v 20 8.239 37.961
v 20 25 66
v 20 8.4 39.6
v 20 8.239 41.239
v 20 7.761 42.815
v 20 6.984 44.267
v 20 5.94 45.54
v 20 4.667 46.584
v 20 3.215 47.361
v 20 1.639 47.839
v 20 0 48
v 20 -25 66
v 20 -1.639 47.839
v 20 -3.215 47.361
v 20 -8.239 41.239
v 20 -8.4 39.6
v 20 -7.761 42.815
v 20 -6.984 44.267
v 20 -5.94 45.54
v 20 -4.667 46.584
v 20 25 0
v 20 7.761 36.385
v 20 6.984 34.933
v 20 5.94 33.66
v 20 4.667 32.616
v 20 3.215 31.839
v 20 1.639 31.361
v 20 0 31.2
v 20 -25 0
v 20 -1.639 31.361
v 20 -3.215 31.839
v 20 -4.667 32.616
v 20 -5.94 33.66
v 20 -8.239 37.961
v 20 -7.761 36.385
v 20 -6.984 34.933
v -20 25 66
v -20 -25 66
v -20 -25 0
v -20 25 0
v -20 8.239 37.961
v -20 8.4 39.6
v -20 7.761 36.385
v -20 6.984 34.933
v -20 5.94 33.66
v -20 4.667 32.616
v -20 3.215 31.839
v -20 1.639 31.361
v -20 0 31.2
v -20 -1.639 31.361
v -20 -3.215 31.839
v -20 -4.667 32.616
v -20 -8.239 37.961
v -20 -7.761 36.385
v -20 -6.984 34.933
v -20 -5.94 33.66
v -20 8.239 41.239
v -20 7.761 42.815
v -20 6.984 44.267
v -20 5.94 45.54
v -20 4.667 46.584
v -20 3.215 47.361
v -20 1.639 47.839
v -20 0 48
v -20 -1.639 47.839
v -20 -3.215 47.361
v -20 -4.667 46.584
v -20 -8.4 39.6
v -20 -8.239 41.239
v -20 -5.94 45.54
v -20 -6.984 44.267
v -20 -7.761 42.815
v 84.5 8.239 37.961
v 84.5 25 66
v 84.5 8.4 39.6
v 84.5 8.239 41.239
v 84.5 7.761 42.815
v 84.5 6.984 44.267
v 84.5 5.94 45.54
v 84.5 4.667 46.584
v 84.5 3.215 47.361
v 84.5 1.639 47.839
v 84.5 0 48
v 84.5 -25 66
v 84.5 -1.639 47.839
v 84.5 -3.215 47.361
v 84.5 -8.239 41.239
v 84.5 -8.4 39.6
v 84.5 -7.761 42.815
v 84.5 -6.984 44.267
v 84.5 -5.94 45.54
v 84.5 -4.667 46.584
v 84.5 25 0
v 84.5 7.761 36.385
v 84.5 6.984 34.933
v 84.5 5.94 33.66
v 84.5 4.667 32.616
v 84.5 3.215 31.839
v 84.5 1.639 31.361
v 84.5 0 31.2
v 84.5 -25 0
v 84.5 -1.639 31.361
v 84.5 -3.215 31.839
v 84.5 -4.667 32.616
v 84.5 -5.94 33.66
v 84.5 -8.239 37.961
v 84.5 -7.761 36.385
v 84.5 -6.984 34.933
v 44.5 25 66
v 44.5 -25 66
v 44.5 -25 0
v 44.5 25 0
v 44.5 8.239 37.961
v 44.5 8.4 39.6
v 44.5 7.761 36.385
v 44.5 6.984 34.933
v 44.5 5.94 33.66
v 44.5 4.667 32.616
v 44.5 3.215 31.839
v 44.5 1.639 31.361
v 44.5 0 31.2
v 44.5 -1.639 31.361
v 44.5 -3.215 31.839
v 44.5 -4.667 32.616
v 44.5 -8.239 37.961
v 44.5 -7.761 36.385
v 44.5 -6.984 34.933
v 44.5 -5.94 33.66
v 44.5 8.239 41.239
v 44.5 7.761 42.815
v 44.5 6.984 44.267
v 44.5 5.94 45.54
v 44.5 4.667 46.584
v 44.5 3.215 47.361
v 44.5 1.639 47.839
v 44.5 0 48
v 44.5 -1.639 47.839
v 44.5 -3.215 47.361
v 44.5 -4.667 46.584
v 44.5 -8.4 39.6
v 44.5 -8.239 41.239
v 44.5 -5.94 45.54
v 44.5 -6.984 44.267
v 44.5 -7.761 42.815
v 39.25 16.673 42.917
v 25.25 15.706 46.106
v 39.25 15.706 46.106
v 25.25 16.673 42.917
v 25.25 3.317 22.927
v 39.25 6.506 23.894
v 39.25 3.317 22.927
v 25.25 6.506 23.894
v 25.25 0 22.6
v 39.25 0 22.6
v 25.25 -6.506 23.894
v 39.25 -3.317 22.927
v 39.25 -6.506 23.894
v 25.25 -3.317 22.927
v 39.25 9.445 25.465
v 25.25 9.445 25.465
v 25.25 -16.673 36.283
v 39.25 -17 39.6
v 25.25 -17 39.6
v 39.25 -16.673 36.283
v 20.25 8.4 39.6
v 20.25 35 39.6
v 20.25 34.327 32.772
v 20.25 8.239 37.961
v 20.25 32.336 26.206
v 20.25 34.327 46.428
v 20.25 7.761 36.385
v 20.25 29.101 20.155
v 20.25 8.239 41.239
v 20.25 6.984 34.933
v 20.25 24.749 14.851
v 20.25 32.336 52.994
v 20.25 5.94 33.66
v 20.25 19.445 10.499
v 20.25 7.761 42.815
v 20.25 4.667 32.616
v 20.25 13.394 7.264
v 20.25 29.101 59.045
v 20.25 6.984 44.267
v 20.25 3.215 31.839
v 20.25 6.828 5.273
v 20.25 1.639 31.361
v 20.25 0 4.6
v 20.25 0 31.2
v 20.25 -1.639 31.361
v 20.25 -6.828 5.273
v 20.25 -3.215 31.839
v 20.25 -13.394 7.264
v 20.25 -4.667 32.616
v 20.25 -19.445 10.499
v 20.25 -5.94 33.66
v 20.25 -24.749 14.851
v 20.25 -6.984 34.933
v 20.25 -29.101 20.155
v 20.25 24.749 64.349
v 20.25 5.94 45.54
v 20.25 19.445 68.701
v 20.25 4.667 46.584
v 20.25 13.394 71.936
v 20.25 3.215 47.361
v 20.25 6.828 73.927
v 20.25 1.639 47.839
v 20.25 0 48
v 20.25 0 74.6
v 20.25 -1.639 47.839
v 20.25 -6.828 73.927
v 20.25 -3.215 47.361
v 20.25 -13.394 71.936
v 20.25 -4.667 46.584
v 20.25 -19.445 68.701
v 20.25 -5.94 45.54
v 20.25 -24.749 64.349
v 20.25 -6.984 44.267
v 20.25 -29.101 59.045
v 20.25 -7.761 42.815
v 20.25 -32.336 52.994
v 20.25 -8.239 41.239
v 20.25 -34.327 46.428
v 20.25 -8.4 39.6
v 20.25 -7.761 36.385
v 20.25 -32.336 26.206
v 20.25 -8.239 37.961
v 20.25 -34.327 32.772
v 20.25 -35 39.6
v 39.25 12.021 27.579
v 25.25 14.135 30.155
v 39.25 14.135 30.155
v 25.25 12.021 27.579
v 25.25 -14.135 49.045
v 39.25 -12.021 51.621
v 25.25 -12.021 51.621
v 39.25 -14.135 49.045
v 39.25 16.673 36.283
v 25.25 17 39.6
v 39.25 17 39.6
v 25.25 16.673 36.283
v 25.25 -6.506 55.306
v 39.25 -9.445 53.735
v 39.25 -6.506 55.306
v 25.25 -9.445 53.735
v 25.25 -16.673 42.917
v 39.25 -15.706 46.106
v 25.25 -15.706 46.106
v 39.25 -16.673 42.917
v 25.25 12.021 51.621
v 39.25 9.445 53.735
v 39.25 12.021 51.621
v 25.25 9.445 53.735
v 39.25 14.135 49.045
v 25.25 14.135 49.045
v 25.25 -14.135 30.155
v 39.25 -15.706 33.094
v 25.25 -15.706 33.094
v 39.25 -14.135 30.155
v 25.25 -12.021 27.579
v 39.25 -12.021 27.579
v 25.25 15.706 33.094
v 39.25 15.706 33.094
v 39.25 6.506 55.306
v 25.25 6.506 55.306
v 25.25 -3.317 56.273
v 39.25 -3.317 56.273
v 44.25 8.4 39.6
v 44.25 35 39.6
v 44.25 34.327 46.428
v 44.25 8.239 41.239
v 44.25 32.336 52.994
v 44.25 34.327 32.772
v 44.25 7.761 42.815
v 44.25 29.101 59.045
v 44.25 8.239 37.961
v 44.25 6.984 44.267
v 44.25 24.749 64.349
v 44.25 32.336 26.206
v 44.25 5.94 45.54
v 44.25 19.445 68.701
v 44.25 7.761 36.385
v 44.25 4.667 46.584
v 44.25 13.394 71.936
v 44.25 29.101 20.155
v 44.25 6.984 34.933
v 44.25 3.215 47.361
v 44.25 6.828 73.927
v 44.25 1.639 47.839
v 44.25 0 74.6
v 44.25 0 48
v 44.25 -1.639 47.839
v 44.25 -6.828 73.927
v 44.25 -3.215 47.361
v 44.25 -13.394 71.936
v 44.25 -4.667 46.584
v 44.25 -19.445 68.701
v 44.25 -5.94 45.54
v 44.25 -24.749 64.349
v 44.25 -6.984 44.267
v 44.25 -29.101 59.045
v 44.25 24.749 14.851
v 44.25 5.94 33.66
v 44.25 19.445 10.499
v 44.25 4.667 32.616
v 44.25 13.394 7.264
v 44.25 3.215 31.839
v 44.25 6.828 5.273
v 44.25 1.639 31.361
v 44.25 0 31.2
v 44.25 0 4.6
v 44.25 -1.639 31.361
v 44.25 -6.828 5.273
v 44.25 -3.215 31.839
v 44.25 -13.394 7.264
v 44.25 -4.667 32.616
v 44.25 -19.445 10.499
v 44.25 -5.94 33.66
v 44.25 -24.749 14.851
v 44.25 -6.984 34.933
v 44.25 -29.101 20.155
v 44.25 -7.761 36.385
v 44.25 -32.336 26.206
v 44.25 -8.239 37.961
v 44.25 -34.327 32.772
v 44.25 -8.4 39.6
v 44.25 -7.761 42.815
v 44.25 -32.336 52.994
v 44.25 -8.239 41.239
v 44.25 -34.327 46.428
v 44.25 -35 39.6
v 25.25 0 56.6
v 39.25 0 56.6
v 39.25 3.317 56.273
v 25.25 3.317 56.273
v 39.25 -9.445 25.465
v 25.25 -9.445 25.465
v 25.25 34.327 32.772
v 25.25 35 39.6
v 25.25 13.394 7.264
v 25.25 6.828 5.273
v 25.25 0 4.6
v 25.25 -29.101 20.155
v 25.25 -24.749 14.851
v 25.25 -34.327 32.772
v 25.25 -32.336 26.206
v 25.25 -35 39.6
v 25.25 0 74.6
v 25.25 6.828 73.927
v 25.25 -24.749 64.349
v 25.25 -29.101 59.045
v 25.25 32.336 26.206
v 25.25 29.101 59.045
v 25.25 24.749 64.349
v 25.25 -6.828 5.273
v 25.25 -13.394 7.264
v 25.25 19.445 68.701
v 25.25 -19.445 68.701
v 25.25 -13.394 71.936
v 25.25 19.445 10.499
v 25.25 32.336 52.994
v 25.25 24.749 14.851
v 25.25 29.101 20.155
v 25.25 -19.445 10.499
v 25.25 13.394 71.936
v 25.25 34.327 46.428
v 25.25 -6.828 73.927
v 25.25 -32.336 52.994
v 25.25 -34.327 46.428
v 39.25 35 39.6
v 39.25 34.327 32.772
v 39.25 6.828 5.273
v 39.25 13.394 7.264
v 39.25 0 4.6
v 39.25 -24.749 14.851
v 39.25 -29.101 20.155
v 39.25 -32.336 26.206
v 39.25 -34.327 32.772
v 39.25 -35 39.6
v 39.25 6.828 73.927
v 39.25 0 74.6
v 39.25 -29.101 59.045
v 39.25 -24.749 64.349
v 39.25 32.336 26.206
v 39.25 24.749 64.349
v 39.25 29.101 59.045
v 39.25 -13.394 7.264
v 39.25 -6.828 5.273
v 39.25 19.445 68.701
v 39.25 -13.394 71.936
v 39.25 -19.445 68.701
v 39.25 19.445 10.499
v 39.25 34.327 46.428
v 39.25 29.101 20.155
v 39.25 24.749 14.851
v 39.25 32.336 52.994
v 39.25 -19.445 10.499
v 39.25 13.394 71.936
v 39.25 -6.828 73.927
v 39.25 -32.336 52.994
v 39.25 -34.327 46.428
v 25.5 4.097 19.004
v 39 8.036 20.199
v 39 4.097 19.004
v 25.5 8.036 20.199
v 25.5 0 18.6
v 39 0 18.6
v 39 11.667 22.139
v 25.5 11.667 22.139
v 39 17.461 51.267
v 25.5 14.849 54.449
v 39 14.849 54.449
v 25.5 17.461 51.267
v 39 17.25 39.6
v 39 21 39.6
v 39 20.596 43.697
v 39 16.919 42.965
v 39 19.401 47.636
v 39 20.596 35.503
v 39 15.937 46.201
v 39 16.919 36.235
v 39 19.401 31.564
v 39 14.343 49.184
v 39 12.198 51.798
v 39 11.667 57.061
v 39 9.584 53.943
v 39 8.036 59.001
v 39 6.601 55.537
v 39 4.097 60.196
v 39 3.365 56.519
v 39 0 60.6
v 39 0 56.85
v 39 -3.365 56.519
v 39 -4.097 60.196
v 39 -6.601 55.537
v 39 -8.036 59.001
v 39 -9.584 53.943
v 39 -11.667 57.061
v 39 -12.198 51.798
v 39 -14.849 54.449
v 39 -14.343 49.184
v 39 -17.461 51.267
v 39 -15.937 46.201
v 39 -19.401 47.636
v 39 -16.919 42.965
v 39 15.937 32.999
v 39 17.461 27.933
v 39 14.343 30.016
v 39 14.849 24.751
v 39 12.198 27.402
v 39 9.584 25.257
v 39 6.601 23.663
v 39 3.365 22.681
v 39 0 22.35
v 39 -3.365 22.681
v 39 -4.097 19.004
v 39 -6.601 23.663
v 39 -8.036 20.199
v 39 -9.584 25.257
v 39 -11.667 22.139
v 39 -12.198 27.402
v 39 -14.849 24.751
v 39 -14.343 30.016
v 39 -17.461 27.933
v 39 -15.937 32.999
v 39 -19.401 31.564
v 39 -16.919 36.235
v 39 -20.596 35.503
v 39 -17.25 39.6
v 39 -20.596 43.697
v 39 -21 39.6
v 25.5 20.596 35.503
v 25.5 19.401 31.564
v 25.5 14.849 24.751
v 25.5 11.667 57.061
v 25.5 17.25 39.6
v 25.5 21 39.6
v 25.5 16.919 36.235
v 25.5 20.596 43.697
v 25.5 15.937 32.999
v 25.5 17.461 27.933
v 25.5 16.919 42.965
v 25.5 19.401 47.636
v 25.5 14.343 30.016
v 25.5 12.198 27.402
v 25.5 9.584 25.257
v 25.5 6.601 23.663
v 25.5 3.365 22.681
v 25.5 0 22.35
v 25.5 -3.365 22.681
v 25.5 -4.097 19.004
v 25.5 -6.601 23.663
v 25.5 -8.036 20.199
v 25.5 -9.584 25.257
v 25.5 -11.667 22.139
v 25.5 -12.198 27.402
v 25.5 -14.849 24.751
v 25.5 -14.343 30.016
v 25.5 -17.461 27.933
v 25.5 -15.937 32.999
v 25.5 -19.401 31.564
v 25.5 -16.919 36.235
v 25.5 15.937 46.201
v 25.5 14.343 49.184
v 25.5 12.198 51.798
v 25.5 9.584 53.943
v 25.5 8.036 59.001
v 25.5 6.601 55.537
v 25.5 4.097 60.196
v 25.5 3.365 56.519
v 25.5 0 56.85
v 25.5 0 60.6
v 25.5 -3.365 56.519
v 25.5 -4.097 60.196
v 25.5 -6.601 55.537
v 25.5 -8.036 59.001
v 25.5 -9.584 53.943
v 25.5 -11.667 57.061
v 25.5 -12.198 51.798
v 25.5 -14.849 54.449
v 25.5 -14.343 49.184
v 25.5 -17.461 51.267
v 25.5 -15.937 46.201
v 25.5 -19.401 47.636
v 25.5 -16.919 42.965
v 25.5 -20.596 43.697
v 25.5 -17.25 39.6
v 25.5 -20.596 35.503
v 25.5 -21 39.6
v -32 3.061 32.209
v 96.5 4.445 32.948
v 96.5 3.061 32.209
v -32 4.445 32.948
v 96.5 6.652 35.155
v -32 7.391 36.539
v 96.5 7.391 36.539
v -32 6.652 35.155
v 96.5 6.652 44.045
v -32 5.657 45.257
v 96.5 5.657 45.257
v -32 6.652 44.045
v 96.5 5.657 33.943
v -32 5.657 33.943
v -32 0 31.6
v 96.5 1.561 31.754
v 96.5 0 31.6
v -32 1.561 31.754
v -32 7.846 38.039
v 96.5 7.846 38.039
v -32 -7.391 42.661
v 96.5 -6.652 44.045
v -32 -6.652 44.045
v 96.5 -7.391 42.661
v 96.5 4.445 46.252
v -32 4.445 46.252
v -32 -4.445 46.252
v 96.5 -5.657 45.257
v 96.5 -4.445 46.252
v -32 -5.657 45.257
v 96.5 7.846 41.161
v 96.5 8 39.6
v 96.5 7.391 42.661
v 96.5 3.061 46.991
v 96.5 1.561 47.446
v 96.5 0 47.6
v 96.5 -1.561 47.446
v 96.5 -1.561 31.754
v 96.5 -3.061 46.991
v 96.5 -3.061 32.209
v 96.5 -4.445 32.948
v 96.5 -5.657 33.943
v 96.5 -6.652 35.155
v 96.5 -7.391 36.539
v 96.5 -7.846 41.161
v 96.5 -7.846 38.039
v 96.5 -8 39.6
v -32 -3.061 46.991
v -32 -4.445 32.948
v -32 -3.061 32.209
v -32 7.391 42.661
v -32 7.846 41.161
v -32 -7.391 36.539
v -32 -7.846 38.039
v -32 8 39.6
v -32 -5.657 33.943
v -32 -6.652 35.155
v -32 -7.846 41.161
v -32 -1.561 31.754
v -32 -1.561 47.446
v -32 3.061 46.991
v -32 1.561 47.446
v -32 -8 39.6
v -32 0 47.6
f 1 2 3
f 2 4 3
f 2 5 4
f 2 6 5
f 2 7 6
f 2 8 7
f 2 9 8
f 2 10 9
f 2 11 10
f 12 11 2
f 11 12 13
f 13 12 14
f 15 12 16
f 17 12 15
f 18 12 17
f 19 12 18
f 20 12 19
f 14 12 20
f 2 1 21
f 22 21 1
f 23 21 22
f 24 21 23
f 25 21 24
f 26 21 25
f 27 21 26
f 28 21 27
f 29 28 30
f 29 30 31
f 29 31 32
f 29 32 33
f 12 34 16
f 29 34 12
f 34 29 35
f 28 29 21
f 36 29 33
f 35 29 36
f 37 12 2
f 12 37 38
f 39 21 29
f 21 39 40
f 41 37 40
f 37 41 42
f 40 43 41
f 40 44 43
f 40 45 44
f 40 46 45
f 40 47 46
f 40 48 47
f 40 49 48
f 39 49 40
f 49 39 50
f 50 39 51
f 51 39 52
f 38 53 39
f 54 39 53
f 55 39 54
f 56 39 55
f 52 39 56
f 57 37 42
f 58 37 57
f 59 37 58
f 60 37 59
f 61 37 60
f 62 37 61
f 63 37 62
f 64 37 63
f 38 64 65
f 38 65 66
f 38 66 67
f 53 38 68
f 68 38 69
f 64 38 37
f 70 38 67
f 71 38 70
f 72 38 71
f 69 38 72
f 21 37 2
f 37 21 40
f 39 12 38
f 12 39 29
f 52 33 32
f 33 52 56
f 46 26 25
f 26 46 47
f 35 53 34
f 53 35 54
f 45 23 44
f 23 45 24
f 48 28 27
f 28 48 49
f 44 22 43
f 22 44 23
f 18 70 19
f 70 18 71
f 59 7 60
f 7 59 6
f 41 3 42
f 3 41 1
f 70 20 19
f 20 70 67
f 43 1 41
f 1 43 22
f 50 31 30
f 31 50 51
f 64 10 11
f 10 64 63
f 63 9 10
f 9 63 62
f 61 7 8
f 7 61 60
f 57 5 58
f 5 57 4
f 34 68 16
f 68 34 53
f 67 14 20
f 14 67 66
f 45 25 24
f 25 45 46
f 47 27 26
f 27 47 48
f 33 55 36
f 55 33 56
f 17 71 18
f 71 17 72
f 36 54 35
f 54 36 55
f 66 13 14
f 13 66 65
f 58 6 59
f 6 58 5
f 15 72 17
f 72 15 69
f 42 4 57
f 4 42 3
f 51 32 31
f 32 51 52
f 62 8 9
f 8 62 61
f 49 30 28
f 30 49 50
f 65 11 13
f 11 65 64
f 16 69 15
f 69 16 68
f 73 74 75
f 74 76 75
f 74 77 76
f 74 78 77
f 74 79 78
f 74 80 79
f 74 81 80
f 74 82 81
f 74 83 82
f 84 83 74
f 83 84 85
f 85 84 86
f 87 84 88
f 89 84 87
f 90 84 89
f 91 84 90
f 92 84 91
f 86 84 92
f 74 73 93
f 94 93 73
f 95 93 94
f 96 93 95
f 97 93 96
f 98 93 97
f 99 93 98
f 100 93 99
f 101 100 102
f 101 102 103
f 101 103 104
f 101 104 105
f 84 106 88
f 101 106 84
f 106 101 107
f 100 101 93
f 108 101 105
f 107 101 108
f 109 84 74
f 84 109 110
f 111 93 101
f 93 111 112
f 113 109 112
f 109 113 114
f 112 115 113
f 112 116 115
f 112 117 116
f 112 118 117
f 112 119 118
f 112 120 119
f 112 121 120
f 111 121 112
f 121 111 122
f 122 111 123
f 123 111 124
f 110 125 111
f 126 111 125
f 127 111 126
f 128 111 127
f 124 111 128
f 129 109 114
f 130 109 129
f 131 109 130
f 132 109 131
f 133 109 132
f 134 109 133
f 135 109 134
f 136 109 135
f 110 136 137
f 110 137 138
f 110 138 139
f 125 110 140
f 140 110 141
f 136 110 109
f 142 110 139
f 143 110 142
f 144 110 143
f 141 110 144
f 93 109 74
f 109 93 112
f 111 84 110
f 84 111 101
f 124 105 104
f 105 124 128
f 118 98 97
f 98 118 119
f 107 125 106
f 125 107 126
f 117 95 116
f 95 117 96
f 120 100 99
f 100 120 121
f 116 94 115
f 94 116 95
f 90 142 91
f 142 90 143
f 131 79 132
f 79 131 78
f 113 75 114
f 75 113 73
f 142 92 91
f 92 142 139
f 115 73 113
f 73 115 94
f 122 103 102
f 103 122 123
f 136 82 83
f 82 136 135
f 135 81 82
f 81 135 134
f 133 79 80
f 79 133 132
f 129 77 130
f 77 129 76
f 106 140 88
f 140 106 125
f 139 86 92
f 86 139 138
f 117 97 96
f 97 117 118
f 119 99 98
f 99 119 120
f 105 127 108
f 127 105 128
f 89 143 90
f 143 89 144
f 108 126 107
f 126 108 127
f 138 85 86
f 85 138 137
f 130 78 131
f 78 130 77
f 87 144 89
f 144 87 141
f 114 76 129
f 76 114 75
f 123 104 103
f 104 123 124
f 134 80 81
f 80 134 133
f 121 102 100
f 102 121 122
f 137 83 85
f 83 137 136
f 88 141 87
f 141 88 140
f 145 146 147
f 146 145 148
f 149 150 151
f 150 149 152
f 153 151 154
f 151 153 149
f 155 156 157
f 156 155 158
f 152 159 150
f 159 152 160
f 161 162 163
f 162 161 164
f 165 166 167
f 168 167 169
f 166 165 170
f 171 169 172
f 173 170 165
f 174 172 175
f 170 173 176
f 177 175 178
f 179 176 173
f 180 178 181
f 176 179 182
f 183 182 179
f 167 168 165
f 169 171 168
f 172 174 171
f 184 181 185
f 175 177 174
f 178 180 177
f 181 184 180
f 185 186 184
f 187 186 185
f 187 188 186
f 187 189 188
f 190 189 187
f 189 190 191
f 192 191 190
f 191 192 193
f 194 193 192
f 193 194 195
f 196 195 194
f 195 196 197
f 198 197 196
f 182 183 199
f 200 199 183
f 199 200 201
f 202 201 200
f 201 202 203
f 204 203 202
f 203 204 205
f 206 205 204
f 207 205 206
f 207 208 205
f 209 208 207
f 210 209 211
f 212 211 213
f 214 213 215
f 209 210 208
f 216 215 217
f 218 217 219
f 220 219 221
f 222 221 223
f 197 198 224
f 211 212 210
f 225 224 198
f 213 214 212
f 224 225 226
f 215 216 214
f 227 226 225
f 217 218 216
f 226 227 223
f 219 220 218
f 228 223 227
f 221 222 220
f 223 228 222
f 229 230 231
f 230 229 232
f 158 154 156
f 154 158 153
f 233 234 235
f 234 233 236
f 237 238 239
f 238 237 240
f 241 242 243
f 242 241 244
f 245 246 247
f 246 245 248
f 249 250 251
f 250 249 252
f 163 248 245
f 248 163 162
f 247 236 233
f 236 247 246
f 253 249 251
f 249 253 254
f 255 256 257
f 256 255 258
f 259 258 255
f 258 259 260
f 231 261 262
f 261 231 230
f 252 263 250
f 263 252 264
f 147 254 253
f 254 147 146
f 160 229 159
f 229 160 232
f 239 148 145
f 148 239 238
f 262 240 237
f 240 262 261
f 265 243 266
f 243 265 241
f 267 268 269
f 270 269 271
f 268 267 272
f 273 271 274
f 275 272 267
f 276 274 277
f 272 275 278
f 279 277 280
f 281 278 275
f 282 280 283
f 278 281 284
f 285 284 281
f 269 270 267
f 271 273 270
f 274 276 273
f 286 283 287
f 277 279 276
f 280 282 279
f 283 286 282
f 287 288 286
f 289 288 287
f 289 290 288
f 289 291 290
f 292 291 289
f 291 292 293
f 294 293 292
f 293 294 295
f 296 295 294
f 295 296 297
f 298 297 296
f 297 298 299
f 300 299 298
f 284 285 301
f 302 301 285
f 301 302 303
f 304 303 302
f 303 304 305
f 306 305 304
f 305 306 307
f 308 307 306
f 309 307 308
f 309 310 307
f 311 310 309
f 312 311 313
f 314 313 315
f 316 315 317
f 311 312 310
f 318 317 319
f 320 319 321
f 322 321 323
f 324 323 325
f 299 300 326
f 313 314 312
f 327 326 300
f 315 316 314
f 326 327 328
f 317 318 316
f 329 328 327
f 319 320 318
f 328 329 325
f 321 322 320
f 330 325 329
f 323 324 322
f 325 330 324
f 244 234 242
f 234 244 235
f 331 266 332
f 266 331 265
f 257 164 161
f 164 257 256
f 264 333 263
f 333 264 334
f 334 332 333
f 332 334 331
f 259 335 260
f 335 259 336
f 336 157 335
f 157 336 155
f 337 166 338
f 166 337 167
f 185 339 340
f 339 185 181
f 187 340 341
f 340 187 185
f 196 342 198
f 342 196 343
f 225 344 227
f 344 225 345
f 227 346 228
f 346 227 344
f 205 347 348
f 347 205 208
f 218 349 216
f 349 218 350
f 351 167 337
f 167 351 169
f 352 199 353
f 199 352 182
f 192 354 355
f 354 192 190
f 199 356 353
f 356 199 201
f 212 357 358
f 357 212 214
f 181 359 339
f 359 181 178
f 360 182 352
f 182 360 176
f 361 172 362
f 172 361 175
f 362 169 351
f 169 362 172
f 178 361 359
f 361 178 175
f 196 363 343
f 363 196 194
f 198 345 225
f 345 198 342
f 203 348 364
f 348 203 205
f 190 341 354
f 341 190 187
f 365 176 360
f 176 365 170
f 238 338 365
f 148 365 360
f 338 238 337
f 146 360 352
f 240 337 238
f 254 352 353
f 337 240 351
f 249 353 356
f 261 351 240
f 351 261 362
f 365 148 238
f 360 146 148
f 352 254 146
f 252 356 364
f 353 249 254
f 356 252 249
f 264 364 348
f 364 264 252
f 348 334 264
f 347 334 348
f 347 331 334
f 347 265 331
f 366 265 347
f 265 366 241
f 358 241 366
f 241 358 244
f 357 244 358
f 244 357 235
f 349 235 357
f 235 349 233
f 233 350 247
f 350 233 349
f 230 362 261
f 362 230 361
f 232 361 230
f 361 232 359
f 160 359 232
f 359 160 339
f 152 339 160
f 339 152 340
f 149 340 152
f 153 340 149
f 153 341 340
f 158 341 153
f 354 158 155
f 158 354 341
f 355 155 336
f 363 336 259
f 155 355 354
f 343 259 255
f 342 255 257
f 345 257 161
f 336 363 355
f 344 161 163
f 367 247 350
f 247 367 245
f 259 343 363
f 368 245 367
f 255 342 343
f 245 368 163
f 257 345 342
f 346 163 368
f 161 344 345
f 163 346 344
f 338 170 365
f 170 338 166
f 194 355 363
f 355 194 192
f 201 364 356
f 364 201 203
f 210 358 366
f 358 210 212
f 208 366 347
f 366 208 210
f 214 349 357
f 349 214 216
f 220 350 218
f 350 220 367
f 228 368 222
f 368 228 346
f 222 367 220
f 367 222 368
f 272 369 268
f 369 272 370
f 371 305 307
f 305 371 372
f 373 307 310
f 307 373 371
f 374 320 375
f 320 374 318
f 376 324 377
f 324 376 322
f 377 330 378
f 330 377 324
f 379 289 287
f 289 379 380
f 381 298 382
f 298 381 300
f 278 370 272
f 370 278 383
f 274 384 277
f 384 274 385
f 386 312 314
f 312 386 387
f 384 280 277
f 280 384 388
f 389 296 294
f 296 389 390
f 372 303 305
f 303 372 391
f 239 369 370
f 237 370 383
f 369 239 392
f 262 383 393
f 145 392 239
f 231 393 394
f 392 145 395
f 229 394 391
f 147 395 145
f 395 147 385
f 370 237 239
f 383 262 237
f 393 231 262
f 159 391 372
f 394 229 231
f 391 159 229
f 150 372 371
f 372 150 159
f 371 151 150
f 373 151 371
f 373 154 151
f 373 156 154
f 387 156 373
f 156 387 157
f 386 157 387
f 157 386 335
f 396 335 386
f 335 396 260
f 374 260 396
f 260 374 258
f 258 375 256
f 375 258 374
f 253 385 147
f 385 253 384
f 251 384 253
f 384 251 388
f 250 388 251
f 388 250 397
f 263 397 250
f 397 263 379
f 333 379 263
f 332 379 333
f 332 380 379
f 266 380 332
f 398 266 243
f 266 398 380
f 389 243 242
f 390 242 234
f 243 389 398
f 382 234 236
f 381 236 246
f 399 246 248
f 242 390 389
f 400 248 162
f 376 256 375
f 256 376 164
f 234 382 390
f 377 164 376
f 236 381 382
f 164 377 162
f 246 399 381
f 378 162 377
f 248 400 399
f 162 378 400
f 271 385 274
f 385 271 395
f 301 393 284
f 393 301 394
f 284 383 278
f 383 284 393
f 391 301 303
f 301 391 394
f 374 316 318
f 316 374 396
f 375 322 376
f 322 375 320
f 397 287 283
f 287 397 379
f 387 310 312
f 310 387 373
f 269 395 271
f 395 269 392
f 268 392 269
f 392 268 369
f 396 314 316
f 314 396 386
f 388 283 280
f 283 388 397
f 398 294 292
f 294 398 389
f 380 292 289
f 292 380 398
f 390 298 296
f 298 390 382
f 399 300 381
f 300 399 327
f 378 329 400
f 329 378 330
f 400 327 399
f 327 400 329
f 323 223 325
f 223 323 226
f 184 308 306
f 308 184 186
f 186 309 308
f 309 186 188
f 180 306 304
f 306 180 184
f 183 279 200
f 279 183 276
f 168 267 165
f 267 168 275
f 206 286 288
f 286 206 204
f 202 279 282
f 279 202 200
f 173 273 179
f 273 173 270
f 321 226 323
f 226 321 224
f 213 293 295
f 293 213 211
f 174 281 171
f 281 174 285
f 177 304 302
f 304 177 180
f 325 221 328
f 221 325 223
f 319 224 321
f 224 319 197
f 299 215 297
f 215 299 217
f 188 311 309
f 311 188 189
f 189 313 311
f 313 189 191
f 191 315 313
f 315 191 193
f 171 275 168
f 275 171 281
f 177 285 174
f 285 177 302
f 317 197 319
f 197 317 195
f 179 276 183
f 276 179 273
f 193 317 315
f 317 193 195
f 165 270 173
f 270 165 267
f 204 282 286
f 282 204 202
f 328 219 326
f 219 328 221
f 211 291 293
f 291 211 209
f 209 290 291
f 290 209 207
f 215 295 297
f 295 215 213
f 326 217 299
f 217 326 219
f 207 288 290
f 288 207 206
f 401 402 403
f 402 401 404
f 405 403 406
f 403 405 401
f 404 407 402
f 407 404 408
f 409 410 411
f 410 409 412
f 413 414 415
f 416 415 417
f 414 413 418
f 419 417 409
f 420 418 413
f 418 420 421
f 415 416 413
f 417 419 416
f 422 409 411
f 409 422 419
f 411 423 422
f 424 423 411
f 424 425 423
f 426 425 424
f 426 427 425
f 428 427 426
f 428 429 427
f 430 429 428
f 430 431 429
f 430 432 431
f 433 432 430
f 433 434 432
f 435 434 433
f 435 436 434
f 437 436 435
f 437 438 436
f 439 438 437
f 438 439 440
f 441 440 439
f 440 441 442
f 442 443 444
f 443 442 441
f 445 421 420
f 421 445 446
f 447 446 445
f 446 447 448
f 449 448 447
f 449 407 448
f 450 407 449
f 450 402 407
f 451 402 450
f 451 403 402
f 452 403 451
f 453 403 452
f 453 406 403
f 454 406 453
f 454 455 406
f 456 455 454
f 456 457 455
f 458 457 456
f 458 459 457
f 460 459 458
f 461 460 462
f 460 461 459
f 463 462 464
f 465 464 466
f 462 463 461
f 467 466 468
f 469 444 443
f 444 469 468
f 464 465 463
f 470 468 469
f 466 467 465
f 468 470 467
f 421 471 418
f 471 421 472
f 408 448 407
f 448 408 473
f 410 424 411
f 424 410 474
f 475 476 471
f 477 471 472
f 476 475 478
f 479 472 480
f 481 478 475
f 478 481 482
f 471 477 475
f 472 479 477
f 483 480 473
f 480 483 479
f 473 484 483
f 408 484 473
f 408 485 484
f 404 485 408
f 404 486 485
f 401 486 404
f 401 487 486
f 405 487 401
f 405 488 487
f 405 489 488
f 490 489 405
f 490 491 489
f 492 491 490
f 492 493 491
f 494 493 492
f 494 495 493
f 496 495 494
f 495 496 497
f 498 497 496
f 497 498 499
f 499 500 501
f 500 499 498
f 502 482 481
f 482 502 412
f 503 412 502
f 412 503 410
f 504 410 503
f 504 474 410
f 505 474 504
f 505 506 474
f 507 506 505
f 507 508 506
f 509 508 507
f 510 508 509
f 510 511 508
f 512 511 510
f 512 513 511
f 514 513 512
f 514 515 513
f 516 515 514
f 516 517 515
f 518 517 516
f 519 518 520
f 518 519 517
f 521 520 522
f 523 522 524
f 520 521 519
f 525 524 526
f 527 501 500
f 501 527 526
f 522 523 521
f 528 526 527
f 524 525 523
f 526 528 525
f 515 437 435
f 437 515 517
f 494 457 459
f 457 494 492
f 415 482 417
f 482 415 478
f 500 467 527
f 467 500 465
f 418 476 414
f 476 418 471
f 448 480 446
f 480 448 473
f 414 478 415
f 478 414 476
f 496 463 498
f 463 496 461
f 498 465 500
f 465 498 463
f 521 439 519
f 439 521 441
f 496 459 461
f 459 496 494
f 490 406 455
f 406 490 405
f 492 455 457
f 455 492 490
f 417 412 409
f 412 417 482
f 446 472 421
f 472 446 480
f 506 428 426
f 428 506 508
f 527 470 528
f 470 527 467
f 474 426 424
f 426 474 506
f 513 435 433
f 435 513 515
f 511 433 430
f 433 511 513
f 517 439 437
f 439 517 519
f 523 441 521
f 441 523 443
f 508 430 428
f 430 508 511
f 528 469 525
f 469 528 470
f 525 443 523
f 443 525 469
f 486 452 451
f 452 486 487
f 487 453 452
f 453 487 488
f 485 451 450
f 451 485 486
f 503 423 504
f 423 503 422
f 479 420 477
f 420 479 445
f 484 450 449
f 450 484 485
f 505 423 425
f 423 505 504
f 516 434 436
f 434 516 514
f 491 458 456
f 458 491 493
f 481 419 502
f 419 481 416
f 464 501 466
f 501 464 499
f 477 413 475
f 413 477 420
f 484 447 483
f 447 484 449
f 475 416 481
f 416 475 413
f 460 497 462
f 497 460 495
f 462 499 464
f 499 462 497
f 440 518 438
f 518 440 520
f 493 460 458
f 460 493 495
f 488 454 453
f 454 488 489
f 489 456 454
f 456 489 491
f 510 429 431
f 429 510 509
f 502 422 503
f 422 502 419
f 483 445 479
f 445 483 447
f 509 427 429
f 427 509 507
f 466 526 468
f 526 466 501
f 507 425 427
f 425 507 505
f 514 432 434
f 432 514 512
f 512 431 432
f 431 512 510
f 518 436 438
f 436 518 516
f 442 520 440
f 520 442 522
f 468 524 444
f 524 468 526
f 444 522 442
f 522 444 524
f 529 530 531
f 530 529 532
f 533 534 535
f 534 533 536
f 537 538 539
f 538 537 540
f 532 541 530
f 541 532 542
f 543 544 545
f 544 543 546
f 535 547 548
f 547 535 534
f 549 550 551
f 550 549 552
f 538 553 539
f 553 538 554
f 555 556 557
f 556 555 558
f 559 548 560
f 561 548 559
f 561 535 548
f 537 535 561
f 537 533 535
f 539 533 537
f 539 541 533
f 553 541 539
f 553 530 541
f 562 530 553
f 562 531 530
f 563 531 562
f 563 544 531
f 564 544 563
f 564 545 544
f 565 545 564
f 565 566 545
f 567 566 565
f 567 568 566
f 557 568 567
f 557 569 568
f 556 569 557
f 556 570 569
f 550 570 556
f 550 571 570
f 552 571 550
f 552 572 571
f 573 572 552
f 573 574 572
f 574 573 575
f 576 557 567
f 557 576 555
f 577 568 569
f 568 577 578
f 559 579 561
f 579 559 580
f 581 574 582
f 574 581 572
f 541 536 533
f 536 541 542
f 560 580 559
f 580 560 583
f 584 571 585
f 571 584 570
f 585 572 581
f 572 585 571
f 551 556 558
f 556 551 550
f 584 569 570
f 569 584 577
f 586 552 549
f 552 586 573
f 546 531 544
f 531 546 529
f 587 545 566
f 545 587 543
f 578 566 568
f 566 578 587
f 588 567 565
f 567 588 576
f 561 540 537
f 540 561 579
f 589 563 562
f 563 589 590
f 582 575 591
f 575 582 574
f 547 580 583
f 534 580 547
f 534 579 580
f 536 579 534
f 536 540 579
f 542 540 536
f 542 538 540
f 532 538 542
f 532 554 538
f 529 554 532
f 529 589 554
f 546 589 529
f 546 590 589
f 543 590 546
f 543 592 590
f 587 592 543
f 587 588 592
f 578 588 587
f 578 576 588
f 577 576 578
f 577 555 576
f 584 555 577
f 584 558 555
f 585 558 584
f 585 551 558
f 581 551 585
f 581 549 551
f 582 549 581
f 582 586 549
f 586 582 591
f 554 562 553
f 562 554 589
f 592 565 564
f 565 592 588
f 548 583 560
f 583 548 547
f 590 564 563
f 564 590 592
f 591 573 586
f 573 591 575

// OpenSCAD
$fn = 32;

// ------------------------------------------------------------------------
// Pulley assembly: d70 pulley with a belt, shaft d16
// Every part is its own module, assembly() places them once.
// ------------------------------------------------------------------------

// --- part 1 ---
module support1() {
  difference() {
    translate([-20, -25, 0]) cube([40, 50, 66]);
    translate([0, 0, 39.6]) rotate([0, 90, 0]) cylinder(h = 42, d = 16.8, center = true);
  }
}

// --- part 2 ---
module support2() {
  difference() {
    translate([-20, -25, 0]) cube([40, 50, 66]);
    translate([0, 0, 39.6]) rotate([0, 90, 0]) cylinder(h = 42, d = 16.8, center = true);
  }
}

// --- part 3 ---
module shaft() {
  translate([0, 0, -64.25]) cylinder(h = 128.5, d = 16);
}

// --- part 4 ---
module pulley() {
  difference() {
    union() {
      cylinder(h = 24, d = 34);
      cylinder(h = 5, d = 70);
      translate([0, 0, 19]) cylinder(h = 5, d = 70);
    }
    translate([0, 0, -1]) cylinder(h = 26, d = 16.8);
  }
}

// --- part 5 ---
module belt() {
  difference() {
      translate([0, 0, 0]) cylinder(h = 13.5, d = 42);
      translate([0, 0, -1]) cylinder(h = 15.5, d = 34.5);
    }
}

// --- assembly ---
module assembly() {
  translate([0, 0, 0]) rotate([0, 0, 0]) support1();
  translate([64.5, 0, 0]) rotate([0, 0, 0]) support2();
  translate([32.25, 0, 39.6]) rotate([0, 90, 0]) shaft();
  translate([20.25, 0, 39.6]) rotate([0, 90, 0]) pulley();
  translate([25.5, 0, 39.6]) rotate([0, 90, 0]) belt();
}

assembly();
